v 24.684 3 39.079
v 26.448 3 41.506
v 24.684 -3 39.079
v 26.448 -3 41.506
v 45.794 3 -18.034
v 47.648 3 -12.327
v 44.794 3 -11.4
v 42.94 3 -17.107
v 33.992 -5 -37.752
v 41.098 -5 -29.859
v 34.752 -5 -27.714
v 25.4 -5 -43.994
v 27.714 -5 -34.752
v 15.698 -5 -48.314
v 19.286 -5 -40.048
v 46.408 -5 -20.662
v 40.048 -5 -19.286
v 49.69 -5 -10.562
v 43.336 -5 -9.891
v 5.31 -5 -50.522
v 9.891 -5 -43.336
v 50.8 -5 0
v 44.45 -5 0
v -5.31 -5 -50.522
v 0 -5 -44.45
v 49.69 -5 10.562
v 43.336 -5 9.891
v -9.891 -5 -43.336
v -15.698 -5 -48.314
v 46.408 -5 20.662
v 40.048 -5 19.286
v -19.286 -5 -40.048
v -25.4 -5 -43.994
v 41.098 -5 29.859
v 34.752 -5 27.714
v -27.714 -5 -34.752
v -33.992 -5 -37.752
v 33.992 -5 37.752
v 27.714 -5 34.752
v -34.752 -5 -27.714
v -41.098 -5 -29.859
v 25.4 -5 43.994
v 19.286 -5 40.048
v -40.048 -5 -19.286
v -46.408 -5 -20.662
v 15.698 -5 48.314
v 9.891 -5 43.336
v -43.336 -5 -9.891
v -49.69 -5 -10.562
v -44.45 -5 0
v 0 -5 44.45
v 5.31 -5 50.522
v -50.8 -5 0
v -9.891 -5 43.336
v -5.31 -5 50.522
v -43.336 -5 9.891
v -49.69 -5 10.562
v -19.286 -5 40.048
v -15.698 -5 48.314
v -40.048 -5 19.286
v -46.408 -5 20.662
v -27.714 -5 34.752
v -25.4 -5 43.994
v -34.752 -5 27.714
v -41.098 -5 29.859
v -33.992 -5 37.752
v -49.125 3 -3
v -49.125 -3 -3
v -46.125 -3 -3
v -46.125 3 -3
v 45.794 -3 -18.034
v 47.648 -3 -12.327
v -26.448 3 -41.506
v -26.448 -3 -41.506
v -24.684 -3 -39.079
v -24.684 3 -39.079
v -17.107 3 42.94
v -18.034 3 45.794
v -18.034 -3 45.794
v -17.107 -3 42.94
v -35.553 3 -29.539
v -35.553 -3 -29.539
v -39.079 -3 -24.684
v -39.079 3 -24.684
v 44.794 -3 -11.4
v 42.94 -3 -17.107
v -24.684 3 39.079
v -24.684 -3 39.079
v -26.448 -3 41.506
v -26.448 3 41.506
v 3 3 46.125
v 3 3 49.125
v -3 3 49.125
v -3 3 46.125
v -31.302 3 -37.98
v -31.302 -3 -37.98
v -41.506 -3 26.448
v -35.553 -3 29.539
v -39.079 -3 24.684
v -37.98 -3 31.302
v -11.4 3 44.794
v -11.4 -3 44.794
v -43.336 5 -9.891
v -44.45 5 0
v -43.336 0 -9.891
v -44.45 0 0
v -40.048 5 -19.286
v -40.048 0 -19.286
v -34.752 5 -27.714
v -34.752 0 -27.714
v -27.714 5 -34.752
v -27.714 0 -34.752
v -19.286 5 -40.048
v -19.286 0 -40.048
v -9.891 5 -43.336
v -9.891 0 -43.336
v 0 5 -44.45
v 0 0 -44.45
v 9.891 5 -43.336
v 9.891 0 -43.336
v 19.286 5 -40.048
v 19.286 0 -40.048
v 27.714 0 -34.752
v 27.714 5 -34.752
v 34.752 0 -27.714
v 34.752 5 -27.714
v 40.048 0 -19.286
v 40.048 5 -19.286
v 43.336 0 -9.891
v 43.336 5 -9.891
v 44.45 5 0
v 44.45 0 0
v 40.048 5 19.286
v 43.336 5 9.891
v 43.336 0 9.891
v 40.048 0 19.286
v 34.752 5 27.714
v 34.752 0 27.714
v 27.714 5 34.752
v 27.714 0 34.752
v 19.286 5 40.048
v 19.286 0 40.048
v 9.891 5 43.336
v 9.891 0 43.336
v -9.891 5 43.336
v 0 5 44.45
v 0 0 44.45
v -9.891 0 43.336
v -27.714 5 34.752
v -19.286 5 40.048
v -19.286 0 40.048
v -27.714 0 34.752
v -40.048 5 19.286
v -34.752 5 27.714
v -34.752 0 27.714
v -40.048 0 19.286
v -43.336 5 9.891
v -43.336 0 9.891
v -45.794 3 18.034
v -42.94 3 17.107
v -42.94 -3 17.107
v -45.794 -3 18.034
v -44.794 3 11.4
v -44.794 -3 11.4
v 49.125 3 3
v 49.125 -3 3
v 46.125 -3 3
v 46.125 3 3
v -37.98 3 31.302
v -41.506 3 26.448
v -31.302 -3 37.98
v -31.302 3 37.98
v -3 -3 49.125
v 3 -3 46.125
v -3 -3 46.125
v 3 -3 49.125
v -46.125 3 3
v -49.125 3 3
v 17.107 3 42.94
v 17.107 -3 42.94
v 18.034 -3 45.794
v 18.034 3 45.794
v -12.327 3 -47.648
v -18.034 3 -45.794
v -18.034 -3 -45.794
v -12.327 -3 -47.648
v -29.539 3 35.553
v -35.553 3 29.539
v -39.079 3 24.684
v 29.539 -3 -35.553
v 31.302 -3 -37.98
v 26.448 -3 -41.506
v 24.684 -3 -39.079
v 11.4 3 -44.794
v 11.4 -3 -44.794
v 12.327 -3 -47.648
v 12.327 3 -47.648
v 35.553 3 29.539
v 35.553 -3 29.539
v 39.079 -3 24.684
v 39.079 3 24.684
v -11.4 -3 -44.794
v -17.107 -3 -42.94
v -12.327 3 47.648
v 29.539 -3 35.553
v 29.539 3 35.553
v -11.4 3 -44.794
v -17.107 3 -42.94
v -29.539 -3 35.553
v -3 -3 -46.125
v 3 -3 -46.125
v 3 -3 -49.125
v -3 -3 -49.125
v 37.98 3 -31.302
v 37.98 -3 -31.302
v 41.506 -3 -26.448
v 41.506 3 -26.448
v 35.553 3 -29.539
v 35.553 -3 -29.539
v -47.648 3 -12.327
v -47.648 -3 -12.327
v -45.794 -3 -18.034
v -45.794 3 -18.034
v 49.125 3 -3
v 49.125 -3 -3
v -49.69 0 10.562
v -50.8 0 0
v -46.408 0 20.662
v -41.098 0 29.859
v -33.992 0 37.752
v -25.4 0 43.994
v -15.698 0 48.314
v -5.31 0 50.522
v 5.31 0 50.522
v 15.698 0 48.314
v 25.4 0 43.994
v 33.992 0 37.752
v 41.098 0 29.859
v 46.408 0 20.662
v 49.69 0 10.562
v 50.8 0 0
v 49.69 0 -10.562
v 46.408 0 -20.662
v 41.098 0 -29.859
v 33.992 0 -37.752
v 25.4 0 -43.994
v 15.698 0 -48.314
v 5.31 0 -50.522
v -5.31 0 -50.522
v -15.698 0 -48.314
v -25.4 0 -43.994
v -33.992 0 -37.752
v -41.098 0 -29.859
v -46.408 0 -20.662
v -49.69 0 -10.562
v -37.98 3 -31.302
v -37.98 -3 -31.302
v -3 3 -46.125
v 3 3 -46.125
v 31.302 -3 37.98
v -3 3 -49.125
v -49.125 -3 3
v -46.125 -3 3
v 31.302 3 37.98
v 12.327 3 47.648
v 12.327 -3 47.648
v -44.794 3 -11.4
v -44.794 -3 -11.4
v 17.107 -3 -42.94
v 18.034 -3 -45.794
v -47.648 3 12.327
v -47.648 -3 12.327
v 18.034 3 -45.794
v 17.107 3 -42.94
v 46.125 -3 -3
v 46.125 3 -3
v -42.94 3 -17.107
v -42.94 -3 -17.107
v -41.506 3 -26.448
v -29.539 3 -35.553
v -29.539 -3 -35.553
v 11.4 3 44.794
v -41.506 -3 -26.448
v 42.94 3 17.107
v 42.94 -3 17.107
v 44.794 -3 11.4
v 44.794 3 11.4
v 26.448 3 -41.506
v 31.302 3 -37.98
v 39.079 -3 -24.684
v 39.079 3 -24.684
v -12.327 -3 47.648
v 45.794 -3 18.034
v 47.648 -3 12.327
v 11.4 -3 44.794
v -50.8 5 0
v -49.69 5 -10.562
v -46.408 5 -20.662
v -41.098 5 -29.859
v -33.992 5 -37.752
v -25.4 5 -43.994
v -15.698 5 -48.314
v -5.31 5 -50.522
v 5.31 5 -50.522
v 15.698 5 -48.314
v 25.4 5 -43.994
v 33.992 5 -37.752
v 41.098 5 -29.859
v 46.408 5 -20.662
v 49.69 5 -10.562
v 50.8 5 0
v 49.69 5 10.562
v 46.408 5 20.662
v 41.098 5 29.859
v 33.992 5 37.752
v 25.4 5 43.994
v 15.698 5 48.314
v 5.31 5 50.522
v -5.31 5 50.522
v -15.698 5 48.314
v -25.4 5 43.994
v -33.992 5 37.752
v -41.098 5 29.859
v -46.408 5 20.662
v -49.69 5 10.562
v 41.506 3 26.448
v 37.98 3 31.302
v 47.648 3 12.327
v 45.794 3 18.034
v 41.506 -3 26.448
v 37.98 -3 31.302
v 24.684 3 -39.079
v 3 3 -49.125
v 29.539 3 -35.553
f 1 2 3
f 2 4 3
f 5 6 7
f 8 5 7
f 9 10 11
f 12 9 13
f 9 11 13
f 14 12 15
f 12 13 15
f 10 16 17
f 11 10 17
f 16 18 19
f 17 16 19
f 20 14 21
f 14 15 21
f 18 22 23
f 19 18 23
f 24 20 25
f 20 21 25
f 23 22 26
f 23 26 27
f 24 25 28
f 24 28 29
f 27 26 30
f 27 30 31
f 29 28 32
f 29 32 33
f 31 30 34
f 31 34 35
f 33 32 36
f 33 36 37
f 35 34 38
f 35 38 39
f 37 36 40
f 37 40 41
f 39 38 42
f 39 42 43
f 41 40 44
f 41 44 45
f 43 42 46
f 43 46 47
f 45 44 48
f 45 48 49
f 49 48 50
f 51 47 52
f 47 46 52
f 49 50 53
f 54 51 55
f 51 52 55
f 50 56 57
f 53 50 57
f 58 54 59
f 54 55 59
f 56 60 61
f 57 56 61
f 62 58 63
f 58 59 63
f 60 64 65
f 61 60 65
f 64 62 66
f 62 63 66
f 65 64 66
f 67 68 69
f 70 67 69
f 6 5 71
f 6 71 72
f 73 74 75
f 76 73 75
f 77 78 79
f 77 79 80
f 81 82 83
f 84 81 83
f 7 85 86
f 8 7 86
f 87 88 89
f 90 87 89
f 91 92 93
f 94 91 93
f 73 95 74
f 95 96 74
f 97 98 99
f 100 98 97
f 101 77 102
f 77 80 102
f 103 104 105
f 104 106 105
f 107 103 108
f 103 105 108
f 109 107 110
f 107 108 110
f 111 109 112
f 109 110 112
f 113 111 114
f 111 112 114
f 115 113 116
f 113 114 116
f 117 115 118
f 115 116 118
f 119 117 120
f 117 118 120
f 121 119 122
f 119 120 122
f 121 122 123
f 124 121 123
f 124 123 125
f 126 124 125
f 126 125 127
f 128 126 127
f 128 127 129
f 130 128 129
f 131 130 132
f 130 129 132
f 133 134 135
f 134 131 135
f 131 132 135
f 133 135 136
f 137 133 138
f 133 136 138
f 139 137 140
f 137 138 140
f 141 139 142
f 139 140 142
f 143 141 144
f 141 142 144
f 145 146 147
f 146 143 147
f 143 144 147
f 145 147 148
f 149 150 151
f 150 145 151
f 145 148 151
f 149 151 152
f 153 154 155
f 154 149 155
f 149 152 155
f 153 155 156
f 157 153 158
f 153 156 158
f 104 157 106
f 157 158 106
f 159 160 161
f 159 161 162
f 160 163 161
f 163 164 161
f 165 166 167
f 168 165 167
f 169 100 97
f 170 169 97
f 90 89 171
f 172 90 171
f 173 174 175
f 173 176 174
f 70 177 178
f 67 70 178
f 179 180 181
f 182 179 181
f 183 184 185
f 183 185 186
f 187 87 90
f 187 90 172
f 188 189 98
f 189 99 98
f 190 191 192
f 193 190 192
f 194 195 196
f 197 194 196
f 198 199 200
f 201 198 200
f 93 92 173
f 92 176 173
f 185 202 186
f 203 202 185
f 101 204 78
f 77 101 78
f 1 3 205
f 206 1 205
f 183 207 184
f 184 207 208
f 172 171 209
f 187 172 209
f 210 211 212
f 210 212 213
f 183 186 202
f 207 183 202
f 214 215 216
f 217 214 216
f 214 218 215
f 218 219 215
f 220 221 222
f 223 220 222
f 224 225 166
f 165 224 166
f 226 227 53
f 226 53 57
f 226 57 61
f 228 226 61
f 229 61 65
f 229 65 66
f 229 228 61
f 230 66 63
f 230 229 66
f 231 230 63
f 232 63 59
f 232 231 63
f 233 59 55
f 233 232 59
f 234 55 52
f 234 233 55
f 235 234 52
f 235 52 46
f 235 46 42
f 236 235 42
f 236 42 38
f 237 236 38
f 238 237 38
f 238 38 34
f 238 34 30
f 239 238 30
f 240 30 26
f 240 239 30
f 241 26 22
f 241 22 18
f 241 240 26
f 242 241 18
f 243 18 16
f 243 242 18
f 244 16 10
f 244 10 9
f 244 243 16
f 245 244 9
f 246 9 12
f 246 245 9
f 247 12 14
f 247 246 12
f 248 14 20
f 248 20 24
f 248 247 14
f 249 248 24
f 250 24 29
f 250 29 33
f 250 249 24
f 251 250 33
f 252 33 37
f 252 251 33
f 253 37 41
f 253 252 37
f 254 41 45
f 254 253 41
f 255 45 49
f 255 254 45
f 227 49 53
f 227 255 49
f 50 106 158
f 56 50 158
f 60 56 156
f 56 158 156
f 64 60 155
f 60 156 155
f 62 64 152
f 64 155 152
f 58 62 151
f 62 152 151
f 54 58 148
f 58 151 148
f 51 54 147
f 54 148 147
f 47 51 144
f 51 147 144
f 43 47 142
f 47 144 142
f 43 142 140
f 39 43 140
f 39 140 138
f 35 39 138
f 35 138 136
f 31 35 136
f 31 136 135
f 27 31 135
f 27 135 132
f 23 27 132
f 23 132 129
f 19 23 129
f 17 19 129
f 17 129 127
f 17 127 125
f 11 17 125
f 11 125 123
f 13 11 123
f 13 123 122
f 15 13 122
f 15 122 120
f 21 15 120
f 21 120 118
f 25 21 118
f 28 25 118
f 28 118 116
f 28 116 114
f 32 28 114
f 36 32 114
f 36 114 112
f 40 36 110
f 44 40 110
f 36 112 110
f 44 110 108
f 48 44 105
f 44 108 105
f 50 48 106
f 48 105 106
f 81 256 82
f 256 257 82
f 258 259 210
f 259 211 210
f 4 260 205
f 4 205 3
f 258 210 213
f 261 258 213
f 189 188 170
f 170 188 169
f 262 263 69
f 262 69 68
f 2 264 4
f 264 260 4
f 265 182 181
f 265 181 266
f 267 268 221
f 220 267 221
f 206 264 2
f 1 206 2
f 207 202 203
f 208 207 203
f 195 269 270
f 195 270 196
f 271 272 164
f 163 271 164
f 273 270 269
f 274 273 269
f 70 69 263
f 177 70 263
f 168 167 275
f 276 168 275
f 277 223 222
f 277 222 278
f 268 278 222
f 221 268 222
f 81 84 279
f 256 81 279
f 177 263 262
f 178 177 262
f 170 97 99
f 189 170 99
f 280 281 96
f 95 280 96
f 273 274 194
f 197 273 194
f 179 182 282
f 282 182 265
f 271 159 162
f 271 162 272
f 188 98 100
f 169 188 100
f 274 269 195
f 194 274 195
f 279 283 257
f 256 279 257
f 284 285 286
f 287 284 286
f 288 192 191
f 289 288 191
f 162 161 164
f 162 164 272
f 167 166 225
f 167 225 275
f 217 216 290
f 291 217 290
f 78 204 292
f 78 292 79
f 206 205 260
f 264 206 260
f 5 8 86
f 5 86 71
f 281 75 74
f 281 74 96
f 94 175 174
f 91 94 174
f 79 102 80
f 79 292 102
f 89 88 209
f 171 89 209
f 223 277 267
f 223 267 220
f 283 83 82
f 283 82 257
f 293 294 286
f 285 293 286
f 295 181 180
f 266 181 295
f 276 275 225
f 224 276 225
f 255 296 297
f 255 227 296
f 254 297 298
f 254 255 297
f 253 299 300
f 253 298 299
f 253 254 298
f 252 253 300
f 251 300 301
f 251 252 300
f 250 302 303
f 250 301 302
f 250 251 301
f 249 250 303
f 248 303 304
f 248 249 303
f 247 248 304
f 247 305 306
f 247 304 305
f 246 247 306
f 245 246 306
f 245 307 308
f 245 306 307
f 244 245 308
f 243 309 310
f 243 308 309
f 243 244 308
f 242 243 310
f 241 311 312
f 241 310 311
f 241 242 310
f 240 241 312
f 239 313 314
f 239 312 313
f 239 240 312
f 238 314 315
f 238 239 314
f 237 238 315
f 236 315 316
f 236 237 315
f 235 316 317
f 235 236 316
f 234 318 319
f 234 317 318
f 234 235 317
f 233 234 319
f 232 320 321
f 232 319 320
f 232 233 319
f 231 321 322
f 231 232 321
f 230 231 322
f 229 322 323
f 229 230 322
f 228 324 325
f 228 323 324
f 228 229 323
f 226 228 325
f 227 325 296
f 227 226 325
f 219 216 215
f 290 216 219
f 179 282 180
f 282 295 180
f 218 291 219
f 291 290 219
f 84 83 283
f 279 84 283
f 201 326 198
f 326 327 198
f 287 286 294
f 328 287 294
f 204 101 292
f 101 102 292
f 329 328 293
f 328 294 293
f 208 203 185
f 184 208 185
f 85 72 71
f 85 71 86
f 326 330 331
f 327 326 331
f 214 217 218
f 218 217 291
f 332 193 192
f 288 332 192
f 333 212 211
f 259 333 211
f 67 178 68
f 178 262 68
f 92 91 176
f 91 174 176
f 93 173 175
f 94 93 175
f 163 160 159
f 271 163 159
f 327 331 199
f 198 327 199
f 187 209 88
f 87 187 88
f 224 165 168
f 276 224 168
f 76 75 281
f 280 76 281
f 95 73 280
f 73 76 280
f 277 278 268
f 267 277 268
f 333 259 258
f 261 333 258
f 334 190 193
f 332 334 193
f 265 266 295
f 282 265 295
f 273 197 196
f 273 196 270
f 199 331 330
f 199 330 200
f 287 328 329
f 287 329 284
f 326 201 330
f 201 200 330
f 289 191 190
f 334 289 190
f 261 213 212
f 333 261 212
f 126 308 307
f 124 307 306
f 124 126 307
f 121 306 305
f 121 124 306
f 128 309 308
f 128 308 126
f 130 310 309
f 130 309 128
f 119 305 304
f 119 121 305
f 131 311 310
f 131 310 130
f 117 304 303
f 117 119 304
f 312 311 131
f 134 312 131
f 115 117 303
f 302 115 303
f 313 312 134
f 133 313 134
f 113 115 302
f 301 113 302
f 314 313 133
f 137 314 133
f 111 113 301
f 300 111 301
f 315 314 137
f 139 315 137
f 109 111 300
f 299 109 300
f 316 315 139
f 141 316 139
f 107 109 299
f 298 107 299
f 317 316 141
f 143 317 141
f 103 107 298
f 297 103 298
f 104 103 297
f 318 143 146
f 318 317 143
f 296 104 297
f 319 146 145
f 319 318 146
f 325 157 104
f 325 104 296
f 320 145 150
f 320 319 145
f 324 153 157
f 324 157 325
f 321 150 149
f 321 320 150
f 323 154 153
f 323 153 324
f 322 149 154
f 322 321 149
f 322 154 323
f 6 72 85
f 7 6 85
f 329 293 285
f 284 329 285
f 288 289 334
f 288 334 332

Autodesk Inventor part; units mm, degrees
ref_plane "YZ Plane" through (0, 0, 0) normal (1, 0, 0) x (0, 1, 0)
ref_plane "XZ Plane" through (0, 0, 0) normal (0, 1, 0) x (-1, 0, 0)
ref_plane "XY Plane" through (0, 0, 0) normal (0, 0, 1) x (1, 0, 0)
sketch "Sketch1" plane through (0, 0, 0) normal (0, 1, 0) x (-1, 0, 0)
  circle A0 centre (0, 0) radius 50.8
  circle A1 centre (0, 0) radius 44.45
  dimension "d0" = 88.9
  dimension "d1" = 101.6
extrude "Extrusion1" add sketch "Sketch1" along normal mid plane 10
sketch "Sketch2" plane through (0, 0, 0) normal (0, 1, 0) x (-1, 0, 0)
  circle A0 centre (0, 0) radius 50.8 construction
  line L0 (50.8, 0) -> (44.45, 0) construction
  circle A1 centre (0, 0) radius 44.45 construction
  line L1 (46.125, 3) -> (49.125, 3)
  line L2 (49.125, 3) -> (49.125, -3)
  line L3 (49.125, -3) -> (46.125, -3)
  line L4 (46.125, -3) -> (46.125, 3)
  line L5 (46.125, 3) -> (49.125, -3) construction
  line L6 (49.125, 3) -> (46.125, -3) construction
  line L7 (42.9404, -17.1066) -> (44.7945, -11.4002)
  line L8 (45.7936, -18.0336) -> (42.9404, -17.1066)
  line L9 (47.6477, -12.3273) -> (45.7936, -18.0336)
  line L10 (44.7945, -11.4002) -> (47.6477, -12.3273)
  line L11 (35.5526, -29.5386) -> (39.0793, -24.6845)
  line L12 (37.9796, -31.302) -> (35.5526, -29.5386)
  line L13 (41.5063, -26.4479) -> (37.9796, -31.302)
  line L14 (39.0793, -24.6845) -> (41.5063, -26.4479)
  line L15 (24.6845, -39.0793) -> (29.5386, -35.5526)
  line L16 (26.4479, -41.5063) -> (24.6845, -39.0793)
  line L17 (31.302, -37.9796) -> (26.4479, -41.5063)
  line L18 (29.5386, -35.5526) -> (31.302, -37.9796)
  line L19 (11.4002, -44.7945) -> (17.1066, -42.9404)
  line L20 (12.3273, -47.6477) -> (11.4002, -44.7945)
  line L21 (18.0336, -45.7936) -> (12.3273, -47.6477)
  line L22 (17.1066, -42.9404) -> (18.0336, -45.7936)
  line L23 (-3, -46.125) -> (3, -46.125)
  line L24 (-3, -49.125) -> (-3, -46.125)
  line L25 (3, -49.125) -> (-3, -49.125)
  line L26 (3, -46.125) -> (3, -49.125)
  line L27 (-17.1066, -42.9404) -> (-11.4002, -44.7945)
  line L28 (-18.0336, -45.7936) -> (-17.1066, -42.9404)
  line L29 (-12.3273, -47.6477) -> (-18.0336, -45.7936)
  line L30 (-11.4002, -44.7945) -> (-12.3273, -47.6477)
  line L31 (-29.5386, -35.5526) -> (-24.6845, -39.0793)
  line L32 (-31.302, -37.9796) -> (-29.5386, -35.5526)
  line L33 (-26.4479, -41.5063) -> (-31.302, -37.9796)
  line L34 (-24.6845, -39.0793) -> (-26.4479, -41.5063)
  line L35 (-39.0793, -24.6845) -> (-35.5526, -29.5386)
  line L36 (-41.5063, -26.4479) -> (-39.0793, -24.6845)
  line L37 (-37.9796, -31.302) -> (-41.5063, -26.4479)
  line L38 (-35.5526, -29.5386) -> (-37.9796, -31.302)
  line L39 (-44.7945, -11.4002) -> (-42.9404, -17.1066)
  line L40 (-47.6477, -12.3273) -> (-44.7945, -11.4002)
  line L41 (-45.7936, -18.0336) -> (-47.6477, -12.3273)
  line L42 (-42.9404, -17.1066) -> (-45.7936, -18.0336)
  line L43 (-46.125, 3) -> (-46.125, -3)
  line L44 (-49.125, 3) -> (-46.125, 3)
  line L45 (-49.125, -3) -> (-49.125, 3)
  line L46 (-46.125, -3) -> (-49.125, -3)
  line L47 (-42.9404, 17.1066) -> (-44.7945, 11.4002)
  line L48 (-45.7936, 18.0336) -> (-42.9404, 17.1066)
  line L49 (-47.6477, 12.3273) -> (-45.7936, 18.0336)
  line L50 (-44.7945, 11.4002) -> (-47.6477, 12.3273)
  line L51 (-35.5526, 29.5386) -> (-39.0793, 24.6845)
  line L52 (-37.9796, 31.302) -> (-35.5526, 29.5386)
  line L53 (-41.5063, 26.4479) -> (-37.9796, 31.302)
  line L54 (-39.0793, 24.6845) -> (-41.5063, 26.4479)
  line L55 (-24.6845, 39.0793) -> (-29.5386, 35.5526)
  line L56 (-26.4479, 41.5063) -> (-24.6845, 39.0793)
  line L57 (-31.302, 37.9796) -> (-26.4479, 41.5063)
  line L58 (-29.5386, 35.5526) -> (-31.302, 37.9796)
  line L59 (-11.4002, 44.7945) -> (-17.1066, 42.9404)
  line L60 (-12.3273, 47.6477) -> (-11.4002, 44.7945)
  line L61 (-18.0336, 45.7936) -> (-12.3273, 47.6477)
  line L62 (-17.1066, 42.9404) -> (-18.0336, 45.7936)
  line L63 (3, 46.125) -> (-3, 46.125)
  line L64 (3, 49.125) -> (3, 46.125)
  line L65 (-3, 49.125) -> (3, 49.125)
  line L66 (-3, 46.125) -> (-3, 49.125)
  line L67 (17.1066, 42.9404) -> (11.4002, 44.7945)
  line L68 (18.0336, 45.7936) -> (17.1066, 42.9404)
  line L69 (12.3273, 47.6477) -> (18.0336, 45.7936)
  line L70 (11.4002, 44.7945) -> (12.3273, 47.6477)
  line L71 (29.5386, 35.5526) -> (24.6845, 39.0793)
  line L72 (31.302, 37.9796) -> (29.5386, 35.5526)
  line L73 (26.4479, 41.5063) -> (31.302, 37.9796)
  line L74 (24.6845, 39.0793) -> (26.4479, 41.5063)
  line L75 (39.0793, 24.6845) -> (35.5526, 29.5386)
  line L76 (41.5063, 26.4479) -> (39.0793, 24.6845)
  line L77 (37.9796, 31.302) -> (41.5063, 26.4479)
  line L78 (35.5526, 29.5386) -> (37.9796, 31.302)
  line L79 (44.7945, 11.4002) -> (42.9404, 17.1066)
  line L80 (47.6477, 12.3273) -> (44.7945, 11.4002)
  line L81 (45.7936, 18.0336) -> (47.6477, 12.3273)
  line L82 (42.9404, 17.1066) -> (45.7936, 18.0336)
  point P0 (47.625, 0)
  dimension "d4" = 3
  dimension "d5" = 6
  dimension "d8" = 360
extrude "Extrusion2" cut sketch "Sketch2" along normal mid plane 6
properties part number "ring_ABS"
